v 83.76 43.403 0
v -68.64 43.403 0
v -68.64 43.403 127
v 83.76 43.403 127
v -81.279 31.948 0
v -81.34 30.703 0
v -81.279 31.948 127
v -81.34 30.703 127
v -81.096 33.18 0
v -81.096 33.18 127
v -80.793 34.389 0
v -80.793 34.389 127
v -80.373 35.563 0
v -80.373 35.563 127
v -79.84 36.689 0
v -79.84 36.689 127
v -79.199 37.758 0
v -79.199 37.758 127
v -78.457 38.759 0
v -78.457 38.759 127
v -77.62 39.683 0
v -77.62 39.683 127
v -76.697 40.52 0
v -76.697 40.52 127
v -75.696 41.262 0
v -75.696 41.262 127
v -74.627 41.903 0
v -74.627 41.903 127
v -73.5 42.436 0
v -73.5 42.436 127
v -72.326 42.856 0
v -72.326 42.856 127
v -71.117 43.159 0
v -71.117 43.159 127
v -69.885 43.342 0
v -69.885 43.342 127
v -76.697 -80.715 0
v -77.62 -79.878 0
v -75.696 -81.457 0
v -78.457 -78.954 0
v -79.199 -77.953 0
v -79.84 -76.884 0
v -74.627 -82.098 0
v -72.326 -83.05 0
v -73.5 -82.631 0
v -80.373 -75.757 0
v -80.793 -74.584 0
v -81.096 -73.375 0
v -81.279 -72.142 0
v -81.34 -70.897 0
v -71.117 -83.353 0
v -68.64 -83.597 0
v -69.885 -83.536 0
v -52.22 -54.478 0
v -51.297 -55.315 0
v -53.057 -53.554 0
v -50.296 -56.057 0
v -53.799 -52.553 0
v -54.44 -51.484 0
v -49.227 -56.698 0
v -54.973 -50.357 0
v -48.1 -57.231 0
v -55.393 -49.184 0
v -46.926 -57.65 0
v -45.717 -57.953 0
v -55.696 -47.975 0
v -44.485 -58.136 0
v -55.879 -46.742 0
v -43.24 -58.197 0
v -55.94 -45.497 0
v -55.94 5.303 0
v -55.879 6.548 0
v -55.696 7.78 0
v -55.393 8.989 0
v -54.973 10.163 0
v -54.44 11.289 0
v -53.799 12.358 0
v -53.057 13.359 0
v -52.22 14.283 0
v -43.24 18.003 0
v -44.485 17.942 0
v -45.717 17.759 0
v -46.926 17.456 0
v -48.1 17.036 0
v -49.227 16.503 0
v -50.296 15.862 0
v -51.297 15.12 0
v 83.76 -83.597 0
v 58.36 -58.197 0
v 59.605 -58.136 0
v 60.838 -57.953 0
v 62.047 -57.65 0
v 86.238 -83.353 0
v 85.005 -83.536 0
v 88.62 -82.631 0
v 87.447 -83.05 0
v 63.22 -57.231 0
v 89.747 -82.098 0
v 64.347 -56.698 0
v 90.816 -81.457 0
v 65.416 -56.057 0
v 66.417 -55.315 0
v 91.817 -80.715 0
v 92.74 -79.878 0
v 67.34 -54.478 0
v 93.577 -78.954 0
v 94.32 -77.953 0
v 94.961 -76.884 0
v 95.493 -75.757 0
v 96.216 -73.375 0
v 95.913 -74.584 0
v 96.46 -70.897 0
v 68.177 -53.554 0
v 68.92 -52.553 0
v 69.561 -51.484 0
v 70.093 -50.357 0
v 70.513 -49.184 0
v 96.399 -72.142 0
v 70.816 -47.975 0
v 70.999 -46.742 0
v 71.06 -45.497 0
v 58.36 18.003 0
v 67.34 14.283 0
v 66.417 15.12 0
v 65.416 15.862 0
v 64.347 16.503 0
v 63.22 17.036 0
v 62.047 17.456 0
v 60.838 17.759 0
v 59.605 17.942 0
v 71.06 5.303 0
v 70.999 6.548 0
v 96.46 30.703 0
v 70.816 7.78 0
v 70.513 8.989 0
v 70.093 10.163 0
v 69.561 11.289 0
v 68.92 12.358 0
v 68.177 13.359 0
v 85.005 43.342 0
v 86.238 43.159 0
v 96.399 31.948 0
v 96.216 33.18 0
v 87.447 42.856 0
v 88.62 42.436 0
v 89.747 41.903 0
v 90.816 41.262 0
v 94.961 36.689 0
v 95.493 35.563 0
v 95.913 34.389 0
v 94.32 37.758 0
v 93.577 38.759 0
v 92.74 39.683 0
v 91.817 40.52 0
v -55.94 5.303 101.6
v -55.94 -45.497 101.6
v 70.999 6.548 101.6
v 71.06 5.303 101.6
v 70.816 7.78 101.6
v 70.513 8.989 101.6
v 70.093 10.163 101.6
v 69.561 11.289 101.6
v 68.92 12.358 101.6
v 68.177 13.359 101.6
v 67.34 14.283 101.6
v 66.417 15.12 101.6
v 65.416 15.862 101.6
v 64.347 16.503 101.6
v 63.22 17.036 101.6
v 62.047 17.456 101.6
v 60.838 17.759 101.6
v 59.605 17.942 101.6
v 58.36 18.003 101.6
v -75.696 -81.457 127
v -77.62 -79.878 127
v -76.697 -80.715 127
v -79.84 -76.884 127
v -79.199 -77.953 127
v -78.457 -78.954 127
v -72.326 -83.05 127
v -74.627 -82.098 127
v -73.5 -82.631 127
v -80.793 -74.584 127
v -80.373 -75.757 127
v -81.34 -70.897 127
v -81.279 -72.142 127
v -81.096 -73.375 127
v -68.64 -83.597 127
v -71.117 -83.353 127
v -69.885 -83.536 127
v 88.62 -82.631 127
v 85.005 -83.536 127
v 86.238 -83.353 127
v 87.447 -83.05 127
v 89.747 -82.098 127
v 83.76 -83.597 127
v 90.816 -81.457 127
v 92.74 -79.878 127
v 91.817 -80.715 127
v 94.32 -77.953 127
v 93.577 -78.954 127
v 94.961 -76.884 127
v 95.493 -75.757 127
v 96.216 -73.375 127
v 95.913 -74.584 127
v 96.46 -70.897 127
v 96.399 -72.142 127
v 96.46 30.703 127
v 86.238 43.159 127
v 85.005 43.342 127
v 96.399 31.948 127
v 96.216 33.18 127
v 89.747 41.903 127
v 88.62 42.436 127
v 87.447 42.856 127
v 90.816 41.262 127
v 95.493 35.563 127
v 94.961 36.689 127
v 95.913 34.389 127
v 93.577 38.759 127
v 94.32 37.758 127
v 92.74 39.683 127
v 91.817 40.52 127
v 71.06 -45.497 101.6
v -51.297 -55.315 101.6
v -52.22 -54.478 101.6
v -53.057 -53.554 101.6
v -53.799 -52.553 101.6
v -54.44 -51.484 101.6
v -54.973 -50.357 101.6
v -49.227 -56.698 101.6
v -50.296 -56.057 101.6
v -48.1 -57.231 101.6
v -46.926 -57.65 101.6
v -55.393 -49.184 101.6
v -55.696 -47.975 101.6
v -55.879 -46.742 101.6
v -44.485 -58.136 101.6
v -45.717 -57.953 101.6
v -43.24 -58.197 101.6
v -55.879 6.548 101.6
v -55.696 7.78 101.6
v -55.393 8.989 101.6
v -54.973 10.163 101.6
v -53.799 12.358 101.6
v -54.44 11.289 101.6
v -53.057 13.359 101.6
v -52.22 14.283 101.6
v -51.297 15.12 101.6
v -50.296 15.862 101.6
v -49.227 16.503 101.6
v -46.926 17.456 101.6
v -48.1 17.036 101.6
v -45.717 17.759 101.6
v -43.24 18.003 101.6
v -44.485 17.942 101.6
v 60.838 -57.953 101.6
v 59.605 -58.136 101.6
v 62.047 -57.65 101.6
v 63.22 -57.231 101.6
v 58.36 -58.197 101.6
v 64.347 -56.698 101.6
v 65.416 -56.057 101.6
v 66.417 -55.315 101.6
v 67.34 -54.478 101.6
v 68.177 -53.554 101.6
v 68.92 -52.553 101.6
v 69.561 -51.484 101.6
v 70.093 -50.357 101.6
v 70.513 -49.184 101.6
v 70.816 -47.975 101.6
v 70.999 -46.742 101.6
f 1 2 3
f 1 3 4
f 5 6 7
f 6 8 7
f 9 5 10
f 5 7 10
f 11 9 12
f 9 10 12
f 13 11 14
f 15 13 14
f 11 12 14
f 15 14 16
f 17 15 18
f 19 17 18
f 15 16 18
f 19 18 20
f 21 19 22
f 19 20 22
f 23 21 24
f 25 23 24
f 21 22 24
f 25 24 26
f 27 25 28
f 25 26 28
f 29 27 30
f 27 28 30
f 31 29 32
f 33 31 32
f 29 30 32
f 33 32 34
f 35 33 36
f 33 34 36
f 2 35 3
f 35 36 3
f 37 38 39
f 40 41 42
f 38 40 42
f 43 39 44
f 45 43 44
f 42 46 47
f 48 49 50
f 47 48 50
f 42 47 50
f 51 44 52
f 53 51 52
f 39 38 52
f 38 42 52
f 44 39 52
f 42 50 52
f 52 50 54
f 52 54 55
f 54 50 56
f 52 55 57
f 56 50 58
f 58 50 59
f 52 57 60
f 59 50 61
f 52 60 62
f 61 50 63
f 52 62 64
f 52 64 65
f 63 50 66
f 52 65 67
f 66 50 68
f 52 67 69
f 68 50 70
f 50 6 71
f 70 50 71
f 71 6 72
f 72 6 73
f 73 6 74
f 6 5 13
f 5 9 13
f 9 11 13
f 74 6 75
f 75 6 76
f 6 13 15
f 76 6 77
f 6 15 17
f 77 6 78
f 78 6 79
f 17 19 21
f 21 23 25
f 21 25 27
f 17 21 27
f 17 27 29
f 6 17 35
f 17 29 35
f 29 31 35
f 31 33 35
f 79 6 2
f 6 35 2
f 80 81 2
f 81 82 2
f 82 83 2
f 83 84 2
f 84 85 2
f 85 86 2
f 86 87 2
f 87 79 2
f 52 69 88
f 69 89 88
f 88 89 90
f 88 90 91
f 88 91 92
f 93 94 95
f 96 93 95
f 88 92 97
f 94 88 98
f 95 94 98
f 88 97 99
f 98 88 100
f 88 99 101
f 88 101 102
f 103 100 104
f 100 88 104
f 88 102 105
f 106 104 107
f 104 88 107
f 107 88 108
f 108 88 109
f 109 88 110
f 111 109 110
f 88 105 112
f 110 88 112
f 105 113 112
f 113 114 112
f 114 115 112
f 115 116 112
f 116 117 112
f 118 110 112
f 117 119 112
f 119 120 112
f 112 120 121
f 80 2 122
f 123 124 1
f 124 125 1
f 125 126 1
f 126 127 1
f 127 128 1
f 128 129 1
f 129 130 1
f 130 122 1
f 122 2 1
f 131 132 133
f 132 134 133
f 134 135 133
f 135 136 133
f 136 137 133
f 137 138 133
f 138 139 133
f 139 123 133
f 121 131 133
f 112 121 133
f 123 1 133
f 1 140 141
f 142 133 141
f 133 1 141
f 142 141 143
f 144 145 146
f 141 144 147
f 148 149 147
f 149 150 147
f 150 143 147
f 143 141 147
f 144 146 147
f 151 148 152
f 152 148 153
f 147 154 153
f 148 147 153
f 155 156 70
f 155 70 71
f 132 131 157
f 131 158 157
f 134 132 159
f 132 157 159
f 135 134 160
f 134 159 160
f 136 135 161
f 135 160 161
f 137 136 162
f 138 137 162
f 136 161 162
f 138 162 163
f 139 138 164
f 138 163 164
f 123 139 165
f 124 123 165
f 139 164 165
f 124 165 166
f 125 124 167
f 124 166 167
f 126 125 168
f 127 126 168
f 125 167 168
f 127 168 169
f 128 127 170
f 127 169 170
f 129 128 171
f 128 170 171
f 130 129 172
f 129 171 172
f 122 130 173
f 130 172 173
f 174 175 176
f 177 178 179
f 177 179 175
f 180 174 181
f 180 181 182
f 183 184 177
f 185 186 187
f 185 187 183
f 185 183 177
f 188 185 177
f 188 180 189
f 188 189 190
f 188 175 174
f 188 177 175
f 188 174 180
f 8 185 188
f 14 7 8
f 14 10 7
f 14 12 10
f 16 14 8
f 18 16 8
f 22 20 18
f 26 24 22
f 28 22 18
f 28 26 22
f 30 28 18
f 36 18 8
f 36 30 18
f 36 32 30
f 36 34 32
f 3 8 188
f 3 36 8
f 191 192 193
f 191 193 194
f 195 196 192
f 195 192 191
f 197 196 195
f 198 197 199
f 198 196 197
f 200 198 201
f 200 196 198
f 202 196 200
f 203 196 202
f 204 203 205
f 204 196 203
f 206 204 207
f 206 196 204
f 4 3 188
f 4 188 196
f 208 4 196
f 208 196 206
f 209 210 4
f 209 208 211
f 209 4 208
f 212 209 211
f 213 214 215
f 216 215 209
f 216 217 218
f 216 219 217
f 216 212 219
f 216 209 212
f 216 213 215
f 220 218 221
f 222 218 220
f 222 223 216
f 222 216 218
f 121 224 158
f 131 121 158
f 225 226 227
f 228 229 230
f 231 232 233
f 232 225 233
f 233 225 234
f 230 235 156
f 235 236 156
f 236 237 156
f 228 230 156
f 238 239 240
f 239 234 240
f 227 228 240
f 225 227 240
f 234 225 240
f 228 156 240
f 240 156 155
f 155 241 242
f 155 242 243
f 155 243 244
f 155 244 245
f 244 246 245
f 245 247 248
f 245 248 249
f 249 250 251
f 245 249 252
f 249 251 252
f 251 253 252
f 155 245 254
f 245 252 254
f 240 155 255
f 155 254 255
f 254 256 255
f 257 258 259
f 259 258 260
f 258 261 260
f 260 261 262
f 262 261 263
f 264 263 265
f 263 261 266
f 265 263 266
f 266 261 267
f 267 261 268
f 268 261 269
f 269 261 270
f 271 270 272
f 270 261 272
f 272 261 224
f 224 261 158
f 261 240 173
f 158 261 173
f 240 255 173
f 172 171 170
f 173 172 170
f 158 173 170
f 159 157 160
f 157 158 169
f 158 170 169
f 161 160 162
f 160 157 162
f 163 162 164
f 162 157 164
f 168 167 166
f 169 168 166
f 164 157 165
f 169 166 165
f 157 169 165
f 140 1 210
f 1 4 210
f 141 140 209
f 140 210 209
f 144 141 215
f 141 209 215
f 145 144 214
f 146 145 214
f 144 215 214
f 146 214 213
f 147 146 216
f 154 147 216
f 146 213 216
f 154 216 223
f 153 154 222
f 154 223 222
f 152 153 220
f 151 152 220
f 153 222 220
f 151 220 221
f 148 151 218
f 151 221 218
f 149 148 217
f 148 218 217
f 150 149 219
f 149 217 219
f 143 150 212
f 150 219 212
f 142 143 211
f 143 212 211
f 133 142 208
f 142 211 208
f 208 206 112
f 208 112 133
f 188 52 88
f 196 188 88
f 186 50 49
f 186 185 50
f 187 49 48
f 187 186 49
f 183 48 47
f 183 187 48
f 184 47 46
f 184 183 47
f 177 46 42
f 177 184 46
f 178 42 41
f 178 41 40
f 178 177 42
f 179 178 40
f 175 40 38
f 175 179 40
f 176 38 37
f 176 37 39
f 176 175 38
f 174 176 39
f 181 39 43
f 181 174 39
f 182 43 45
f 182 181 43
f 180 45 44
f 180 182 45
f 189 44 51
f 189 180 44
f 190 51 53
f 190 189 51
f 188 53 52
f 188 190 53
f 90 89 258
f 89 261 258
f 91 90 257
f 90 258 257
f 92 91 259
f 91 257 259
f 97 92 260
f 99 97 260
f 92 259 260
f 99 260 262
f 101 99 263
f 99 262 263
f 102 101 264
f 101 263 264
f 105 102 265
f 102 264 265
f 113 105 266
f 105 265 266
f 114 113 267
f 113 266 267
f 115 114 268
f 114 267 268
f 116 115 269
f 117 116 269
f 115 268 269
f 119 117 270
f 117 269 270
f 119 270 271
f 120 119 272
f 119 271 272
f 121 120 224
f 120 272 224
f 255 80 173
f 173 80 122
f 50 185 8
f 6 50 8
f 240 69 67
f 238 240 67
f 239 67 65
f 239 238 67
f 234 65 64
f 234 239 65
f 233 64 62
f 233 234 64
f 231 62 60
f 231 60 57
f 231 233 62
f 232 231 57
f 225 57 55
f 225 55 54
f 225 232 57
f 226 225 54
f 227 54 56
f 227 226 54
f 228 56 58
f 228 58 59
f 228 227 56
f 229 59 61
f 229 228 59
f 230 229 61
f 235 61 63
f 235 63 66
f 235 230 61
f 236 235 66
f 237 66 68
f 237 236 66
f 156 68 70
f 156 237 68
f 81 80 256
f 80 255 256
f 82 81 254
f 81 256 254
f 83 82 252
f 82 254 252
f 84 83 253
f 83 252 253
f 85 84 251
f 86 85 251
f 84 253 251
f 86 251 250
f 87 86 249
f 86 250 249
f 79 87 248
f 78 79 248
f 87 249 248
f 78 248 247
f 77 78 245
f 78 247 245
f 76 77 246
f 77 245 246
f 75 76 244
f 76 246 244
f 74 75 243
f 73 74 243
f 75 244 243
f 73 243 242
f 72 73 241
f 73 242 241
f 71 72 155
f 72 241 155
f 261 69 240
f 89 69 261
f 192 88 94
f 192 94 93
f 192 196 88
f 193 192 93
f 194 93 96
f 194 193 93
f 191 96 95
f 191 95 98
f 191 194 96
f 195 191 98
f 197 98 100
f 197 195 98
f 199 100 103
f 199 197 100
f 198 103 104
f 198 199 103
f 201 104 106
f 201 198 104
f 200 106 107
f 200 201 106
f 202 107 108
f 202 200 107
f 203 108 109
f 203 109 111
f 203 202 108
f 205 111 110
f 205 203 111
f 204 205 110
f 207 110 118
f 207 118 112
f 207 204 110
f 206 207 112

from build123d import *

# Parameters (mm, degrees)
F0_W     = 177.8
F0_H     = 127
F0_W_2   = 127
F0_H_2   = 76.2
F1_DEPTH = 127
F2_DEPTH = 101.6
F3_R     = 12.7
F4_R     = 12.7


with BuildPart() as f1:
    # F0 (on Top) → F1 (new body)
    with BuildSketch(Plane.XY):
        with Locations((7.560192, -20.097298)):
            Rectangle(F0_W, F0_H)
        with Locations((7.560192, -20.097298)):
            Rectangle(F0_W_2, F0_H_2, mode=Mode.SUBTRACT)
        with Locations((7.560192, -20.097298)):
            Rectangle(F0_W_2, F0_H_2)
    extrude(amount=F1_DEPTH)

    # F0 (on Top) → F2 (cut)
    with BuildSketch(Plane.XY):
        with Locations((7.560192, -20.097298)):
            Rectangle(F0_W_2, F0_H_2)
    extrude(amount=F2_DEPTH, mode=Mode.SUBTRACT)

    # F3
    f3_edges = [f1.edges().sort_by_distance(p)[0] for p in [
        (-55.939808, 18.002702, 50.8),
        (-55.939808, -58.197298, 50.8),
        (71.060192, 18.002702, 50.8),
        (71.060192, -58.197298, 50.8),
    ]]
    fillet(f3_edges, radius=F3_R)

    # F4
    f4_edges = [f1.edges().sort_by_distance(p)[0] for p in [
        (96.460192, -83.597298, 63.5),
        (96.460192, 43.402702, 63.5),
        (-81.339808, -83.597298, 63.5),
        (-81.339808, 43.402702, 63.5),
    ]]
    fillet(f4_edges, radius=F4_R)


solid = f1.part
